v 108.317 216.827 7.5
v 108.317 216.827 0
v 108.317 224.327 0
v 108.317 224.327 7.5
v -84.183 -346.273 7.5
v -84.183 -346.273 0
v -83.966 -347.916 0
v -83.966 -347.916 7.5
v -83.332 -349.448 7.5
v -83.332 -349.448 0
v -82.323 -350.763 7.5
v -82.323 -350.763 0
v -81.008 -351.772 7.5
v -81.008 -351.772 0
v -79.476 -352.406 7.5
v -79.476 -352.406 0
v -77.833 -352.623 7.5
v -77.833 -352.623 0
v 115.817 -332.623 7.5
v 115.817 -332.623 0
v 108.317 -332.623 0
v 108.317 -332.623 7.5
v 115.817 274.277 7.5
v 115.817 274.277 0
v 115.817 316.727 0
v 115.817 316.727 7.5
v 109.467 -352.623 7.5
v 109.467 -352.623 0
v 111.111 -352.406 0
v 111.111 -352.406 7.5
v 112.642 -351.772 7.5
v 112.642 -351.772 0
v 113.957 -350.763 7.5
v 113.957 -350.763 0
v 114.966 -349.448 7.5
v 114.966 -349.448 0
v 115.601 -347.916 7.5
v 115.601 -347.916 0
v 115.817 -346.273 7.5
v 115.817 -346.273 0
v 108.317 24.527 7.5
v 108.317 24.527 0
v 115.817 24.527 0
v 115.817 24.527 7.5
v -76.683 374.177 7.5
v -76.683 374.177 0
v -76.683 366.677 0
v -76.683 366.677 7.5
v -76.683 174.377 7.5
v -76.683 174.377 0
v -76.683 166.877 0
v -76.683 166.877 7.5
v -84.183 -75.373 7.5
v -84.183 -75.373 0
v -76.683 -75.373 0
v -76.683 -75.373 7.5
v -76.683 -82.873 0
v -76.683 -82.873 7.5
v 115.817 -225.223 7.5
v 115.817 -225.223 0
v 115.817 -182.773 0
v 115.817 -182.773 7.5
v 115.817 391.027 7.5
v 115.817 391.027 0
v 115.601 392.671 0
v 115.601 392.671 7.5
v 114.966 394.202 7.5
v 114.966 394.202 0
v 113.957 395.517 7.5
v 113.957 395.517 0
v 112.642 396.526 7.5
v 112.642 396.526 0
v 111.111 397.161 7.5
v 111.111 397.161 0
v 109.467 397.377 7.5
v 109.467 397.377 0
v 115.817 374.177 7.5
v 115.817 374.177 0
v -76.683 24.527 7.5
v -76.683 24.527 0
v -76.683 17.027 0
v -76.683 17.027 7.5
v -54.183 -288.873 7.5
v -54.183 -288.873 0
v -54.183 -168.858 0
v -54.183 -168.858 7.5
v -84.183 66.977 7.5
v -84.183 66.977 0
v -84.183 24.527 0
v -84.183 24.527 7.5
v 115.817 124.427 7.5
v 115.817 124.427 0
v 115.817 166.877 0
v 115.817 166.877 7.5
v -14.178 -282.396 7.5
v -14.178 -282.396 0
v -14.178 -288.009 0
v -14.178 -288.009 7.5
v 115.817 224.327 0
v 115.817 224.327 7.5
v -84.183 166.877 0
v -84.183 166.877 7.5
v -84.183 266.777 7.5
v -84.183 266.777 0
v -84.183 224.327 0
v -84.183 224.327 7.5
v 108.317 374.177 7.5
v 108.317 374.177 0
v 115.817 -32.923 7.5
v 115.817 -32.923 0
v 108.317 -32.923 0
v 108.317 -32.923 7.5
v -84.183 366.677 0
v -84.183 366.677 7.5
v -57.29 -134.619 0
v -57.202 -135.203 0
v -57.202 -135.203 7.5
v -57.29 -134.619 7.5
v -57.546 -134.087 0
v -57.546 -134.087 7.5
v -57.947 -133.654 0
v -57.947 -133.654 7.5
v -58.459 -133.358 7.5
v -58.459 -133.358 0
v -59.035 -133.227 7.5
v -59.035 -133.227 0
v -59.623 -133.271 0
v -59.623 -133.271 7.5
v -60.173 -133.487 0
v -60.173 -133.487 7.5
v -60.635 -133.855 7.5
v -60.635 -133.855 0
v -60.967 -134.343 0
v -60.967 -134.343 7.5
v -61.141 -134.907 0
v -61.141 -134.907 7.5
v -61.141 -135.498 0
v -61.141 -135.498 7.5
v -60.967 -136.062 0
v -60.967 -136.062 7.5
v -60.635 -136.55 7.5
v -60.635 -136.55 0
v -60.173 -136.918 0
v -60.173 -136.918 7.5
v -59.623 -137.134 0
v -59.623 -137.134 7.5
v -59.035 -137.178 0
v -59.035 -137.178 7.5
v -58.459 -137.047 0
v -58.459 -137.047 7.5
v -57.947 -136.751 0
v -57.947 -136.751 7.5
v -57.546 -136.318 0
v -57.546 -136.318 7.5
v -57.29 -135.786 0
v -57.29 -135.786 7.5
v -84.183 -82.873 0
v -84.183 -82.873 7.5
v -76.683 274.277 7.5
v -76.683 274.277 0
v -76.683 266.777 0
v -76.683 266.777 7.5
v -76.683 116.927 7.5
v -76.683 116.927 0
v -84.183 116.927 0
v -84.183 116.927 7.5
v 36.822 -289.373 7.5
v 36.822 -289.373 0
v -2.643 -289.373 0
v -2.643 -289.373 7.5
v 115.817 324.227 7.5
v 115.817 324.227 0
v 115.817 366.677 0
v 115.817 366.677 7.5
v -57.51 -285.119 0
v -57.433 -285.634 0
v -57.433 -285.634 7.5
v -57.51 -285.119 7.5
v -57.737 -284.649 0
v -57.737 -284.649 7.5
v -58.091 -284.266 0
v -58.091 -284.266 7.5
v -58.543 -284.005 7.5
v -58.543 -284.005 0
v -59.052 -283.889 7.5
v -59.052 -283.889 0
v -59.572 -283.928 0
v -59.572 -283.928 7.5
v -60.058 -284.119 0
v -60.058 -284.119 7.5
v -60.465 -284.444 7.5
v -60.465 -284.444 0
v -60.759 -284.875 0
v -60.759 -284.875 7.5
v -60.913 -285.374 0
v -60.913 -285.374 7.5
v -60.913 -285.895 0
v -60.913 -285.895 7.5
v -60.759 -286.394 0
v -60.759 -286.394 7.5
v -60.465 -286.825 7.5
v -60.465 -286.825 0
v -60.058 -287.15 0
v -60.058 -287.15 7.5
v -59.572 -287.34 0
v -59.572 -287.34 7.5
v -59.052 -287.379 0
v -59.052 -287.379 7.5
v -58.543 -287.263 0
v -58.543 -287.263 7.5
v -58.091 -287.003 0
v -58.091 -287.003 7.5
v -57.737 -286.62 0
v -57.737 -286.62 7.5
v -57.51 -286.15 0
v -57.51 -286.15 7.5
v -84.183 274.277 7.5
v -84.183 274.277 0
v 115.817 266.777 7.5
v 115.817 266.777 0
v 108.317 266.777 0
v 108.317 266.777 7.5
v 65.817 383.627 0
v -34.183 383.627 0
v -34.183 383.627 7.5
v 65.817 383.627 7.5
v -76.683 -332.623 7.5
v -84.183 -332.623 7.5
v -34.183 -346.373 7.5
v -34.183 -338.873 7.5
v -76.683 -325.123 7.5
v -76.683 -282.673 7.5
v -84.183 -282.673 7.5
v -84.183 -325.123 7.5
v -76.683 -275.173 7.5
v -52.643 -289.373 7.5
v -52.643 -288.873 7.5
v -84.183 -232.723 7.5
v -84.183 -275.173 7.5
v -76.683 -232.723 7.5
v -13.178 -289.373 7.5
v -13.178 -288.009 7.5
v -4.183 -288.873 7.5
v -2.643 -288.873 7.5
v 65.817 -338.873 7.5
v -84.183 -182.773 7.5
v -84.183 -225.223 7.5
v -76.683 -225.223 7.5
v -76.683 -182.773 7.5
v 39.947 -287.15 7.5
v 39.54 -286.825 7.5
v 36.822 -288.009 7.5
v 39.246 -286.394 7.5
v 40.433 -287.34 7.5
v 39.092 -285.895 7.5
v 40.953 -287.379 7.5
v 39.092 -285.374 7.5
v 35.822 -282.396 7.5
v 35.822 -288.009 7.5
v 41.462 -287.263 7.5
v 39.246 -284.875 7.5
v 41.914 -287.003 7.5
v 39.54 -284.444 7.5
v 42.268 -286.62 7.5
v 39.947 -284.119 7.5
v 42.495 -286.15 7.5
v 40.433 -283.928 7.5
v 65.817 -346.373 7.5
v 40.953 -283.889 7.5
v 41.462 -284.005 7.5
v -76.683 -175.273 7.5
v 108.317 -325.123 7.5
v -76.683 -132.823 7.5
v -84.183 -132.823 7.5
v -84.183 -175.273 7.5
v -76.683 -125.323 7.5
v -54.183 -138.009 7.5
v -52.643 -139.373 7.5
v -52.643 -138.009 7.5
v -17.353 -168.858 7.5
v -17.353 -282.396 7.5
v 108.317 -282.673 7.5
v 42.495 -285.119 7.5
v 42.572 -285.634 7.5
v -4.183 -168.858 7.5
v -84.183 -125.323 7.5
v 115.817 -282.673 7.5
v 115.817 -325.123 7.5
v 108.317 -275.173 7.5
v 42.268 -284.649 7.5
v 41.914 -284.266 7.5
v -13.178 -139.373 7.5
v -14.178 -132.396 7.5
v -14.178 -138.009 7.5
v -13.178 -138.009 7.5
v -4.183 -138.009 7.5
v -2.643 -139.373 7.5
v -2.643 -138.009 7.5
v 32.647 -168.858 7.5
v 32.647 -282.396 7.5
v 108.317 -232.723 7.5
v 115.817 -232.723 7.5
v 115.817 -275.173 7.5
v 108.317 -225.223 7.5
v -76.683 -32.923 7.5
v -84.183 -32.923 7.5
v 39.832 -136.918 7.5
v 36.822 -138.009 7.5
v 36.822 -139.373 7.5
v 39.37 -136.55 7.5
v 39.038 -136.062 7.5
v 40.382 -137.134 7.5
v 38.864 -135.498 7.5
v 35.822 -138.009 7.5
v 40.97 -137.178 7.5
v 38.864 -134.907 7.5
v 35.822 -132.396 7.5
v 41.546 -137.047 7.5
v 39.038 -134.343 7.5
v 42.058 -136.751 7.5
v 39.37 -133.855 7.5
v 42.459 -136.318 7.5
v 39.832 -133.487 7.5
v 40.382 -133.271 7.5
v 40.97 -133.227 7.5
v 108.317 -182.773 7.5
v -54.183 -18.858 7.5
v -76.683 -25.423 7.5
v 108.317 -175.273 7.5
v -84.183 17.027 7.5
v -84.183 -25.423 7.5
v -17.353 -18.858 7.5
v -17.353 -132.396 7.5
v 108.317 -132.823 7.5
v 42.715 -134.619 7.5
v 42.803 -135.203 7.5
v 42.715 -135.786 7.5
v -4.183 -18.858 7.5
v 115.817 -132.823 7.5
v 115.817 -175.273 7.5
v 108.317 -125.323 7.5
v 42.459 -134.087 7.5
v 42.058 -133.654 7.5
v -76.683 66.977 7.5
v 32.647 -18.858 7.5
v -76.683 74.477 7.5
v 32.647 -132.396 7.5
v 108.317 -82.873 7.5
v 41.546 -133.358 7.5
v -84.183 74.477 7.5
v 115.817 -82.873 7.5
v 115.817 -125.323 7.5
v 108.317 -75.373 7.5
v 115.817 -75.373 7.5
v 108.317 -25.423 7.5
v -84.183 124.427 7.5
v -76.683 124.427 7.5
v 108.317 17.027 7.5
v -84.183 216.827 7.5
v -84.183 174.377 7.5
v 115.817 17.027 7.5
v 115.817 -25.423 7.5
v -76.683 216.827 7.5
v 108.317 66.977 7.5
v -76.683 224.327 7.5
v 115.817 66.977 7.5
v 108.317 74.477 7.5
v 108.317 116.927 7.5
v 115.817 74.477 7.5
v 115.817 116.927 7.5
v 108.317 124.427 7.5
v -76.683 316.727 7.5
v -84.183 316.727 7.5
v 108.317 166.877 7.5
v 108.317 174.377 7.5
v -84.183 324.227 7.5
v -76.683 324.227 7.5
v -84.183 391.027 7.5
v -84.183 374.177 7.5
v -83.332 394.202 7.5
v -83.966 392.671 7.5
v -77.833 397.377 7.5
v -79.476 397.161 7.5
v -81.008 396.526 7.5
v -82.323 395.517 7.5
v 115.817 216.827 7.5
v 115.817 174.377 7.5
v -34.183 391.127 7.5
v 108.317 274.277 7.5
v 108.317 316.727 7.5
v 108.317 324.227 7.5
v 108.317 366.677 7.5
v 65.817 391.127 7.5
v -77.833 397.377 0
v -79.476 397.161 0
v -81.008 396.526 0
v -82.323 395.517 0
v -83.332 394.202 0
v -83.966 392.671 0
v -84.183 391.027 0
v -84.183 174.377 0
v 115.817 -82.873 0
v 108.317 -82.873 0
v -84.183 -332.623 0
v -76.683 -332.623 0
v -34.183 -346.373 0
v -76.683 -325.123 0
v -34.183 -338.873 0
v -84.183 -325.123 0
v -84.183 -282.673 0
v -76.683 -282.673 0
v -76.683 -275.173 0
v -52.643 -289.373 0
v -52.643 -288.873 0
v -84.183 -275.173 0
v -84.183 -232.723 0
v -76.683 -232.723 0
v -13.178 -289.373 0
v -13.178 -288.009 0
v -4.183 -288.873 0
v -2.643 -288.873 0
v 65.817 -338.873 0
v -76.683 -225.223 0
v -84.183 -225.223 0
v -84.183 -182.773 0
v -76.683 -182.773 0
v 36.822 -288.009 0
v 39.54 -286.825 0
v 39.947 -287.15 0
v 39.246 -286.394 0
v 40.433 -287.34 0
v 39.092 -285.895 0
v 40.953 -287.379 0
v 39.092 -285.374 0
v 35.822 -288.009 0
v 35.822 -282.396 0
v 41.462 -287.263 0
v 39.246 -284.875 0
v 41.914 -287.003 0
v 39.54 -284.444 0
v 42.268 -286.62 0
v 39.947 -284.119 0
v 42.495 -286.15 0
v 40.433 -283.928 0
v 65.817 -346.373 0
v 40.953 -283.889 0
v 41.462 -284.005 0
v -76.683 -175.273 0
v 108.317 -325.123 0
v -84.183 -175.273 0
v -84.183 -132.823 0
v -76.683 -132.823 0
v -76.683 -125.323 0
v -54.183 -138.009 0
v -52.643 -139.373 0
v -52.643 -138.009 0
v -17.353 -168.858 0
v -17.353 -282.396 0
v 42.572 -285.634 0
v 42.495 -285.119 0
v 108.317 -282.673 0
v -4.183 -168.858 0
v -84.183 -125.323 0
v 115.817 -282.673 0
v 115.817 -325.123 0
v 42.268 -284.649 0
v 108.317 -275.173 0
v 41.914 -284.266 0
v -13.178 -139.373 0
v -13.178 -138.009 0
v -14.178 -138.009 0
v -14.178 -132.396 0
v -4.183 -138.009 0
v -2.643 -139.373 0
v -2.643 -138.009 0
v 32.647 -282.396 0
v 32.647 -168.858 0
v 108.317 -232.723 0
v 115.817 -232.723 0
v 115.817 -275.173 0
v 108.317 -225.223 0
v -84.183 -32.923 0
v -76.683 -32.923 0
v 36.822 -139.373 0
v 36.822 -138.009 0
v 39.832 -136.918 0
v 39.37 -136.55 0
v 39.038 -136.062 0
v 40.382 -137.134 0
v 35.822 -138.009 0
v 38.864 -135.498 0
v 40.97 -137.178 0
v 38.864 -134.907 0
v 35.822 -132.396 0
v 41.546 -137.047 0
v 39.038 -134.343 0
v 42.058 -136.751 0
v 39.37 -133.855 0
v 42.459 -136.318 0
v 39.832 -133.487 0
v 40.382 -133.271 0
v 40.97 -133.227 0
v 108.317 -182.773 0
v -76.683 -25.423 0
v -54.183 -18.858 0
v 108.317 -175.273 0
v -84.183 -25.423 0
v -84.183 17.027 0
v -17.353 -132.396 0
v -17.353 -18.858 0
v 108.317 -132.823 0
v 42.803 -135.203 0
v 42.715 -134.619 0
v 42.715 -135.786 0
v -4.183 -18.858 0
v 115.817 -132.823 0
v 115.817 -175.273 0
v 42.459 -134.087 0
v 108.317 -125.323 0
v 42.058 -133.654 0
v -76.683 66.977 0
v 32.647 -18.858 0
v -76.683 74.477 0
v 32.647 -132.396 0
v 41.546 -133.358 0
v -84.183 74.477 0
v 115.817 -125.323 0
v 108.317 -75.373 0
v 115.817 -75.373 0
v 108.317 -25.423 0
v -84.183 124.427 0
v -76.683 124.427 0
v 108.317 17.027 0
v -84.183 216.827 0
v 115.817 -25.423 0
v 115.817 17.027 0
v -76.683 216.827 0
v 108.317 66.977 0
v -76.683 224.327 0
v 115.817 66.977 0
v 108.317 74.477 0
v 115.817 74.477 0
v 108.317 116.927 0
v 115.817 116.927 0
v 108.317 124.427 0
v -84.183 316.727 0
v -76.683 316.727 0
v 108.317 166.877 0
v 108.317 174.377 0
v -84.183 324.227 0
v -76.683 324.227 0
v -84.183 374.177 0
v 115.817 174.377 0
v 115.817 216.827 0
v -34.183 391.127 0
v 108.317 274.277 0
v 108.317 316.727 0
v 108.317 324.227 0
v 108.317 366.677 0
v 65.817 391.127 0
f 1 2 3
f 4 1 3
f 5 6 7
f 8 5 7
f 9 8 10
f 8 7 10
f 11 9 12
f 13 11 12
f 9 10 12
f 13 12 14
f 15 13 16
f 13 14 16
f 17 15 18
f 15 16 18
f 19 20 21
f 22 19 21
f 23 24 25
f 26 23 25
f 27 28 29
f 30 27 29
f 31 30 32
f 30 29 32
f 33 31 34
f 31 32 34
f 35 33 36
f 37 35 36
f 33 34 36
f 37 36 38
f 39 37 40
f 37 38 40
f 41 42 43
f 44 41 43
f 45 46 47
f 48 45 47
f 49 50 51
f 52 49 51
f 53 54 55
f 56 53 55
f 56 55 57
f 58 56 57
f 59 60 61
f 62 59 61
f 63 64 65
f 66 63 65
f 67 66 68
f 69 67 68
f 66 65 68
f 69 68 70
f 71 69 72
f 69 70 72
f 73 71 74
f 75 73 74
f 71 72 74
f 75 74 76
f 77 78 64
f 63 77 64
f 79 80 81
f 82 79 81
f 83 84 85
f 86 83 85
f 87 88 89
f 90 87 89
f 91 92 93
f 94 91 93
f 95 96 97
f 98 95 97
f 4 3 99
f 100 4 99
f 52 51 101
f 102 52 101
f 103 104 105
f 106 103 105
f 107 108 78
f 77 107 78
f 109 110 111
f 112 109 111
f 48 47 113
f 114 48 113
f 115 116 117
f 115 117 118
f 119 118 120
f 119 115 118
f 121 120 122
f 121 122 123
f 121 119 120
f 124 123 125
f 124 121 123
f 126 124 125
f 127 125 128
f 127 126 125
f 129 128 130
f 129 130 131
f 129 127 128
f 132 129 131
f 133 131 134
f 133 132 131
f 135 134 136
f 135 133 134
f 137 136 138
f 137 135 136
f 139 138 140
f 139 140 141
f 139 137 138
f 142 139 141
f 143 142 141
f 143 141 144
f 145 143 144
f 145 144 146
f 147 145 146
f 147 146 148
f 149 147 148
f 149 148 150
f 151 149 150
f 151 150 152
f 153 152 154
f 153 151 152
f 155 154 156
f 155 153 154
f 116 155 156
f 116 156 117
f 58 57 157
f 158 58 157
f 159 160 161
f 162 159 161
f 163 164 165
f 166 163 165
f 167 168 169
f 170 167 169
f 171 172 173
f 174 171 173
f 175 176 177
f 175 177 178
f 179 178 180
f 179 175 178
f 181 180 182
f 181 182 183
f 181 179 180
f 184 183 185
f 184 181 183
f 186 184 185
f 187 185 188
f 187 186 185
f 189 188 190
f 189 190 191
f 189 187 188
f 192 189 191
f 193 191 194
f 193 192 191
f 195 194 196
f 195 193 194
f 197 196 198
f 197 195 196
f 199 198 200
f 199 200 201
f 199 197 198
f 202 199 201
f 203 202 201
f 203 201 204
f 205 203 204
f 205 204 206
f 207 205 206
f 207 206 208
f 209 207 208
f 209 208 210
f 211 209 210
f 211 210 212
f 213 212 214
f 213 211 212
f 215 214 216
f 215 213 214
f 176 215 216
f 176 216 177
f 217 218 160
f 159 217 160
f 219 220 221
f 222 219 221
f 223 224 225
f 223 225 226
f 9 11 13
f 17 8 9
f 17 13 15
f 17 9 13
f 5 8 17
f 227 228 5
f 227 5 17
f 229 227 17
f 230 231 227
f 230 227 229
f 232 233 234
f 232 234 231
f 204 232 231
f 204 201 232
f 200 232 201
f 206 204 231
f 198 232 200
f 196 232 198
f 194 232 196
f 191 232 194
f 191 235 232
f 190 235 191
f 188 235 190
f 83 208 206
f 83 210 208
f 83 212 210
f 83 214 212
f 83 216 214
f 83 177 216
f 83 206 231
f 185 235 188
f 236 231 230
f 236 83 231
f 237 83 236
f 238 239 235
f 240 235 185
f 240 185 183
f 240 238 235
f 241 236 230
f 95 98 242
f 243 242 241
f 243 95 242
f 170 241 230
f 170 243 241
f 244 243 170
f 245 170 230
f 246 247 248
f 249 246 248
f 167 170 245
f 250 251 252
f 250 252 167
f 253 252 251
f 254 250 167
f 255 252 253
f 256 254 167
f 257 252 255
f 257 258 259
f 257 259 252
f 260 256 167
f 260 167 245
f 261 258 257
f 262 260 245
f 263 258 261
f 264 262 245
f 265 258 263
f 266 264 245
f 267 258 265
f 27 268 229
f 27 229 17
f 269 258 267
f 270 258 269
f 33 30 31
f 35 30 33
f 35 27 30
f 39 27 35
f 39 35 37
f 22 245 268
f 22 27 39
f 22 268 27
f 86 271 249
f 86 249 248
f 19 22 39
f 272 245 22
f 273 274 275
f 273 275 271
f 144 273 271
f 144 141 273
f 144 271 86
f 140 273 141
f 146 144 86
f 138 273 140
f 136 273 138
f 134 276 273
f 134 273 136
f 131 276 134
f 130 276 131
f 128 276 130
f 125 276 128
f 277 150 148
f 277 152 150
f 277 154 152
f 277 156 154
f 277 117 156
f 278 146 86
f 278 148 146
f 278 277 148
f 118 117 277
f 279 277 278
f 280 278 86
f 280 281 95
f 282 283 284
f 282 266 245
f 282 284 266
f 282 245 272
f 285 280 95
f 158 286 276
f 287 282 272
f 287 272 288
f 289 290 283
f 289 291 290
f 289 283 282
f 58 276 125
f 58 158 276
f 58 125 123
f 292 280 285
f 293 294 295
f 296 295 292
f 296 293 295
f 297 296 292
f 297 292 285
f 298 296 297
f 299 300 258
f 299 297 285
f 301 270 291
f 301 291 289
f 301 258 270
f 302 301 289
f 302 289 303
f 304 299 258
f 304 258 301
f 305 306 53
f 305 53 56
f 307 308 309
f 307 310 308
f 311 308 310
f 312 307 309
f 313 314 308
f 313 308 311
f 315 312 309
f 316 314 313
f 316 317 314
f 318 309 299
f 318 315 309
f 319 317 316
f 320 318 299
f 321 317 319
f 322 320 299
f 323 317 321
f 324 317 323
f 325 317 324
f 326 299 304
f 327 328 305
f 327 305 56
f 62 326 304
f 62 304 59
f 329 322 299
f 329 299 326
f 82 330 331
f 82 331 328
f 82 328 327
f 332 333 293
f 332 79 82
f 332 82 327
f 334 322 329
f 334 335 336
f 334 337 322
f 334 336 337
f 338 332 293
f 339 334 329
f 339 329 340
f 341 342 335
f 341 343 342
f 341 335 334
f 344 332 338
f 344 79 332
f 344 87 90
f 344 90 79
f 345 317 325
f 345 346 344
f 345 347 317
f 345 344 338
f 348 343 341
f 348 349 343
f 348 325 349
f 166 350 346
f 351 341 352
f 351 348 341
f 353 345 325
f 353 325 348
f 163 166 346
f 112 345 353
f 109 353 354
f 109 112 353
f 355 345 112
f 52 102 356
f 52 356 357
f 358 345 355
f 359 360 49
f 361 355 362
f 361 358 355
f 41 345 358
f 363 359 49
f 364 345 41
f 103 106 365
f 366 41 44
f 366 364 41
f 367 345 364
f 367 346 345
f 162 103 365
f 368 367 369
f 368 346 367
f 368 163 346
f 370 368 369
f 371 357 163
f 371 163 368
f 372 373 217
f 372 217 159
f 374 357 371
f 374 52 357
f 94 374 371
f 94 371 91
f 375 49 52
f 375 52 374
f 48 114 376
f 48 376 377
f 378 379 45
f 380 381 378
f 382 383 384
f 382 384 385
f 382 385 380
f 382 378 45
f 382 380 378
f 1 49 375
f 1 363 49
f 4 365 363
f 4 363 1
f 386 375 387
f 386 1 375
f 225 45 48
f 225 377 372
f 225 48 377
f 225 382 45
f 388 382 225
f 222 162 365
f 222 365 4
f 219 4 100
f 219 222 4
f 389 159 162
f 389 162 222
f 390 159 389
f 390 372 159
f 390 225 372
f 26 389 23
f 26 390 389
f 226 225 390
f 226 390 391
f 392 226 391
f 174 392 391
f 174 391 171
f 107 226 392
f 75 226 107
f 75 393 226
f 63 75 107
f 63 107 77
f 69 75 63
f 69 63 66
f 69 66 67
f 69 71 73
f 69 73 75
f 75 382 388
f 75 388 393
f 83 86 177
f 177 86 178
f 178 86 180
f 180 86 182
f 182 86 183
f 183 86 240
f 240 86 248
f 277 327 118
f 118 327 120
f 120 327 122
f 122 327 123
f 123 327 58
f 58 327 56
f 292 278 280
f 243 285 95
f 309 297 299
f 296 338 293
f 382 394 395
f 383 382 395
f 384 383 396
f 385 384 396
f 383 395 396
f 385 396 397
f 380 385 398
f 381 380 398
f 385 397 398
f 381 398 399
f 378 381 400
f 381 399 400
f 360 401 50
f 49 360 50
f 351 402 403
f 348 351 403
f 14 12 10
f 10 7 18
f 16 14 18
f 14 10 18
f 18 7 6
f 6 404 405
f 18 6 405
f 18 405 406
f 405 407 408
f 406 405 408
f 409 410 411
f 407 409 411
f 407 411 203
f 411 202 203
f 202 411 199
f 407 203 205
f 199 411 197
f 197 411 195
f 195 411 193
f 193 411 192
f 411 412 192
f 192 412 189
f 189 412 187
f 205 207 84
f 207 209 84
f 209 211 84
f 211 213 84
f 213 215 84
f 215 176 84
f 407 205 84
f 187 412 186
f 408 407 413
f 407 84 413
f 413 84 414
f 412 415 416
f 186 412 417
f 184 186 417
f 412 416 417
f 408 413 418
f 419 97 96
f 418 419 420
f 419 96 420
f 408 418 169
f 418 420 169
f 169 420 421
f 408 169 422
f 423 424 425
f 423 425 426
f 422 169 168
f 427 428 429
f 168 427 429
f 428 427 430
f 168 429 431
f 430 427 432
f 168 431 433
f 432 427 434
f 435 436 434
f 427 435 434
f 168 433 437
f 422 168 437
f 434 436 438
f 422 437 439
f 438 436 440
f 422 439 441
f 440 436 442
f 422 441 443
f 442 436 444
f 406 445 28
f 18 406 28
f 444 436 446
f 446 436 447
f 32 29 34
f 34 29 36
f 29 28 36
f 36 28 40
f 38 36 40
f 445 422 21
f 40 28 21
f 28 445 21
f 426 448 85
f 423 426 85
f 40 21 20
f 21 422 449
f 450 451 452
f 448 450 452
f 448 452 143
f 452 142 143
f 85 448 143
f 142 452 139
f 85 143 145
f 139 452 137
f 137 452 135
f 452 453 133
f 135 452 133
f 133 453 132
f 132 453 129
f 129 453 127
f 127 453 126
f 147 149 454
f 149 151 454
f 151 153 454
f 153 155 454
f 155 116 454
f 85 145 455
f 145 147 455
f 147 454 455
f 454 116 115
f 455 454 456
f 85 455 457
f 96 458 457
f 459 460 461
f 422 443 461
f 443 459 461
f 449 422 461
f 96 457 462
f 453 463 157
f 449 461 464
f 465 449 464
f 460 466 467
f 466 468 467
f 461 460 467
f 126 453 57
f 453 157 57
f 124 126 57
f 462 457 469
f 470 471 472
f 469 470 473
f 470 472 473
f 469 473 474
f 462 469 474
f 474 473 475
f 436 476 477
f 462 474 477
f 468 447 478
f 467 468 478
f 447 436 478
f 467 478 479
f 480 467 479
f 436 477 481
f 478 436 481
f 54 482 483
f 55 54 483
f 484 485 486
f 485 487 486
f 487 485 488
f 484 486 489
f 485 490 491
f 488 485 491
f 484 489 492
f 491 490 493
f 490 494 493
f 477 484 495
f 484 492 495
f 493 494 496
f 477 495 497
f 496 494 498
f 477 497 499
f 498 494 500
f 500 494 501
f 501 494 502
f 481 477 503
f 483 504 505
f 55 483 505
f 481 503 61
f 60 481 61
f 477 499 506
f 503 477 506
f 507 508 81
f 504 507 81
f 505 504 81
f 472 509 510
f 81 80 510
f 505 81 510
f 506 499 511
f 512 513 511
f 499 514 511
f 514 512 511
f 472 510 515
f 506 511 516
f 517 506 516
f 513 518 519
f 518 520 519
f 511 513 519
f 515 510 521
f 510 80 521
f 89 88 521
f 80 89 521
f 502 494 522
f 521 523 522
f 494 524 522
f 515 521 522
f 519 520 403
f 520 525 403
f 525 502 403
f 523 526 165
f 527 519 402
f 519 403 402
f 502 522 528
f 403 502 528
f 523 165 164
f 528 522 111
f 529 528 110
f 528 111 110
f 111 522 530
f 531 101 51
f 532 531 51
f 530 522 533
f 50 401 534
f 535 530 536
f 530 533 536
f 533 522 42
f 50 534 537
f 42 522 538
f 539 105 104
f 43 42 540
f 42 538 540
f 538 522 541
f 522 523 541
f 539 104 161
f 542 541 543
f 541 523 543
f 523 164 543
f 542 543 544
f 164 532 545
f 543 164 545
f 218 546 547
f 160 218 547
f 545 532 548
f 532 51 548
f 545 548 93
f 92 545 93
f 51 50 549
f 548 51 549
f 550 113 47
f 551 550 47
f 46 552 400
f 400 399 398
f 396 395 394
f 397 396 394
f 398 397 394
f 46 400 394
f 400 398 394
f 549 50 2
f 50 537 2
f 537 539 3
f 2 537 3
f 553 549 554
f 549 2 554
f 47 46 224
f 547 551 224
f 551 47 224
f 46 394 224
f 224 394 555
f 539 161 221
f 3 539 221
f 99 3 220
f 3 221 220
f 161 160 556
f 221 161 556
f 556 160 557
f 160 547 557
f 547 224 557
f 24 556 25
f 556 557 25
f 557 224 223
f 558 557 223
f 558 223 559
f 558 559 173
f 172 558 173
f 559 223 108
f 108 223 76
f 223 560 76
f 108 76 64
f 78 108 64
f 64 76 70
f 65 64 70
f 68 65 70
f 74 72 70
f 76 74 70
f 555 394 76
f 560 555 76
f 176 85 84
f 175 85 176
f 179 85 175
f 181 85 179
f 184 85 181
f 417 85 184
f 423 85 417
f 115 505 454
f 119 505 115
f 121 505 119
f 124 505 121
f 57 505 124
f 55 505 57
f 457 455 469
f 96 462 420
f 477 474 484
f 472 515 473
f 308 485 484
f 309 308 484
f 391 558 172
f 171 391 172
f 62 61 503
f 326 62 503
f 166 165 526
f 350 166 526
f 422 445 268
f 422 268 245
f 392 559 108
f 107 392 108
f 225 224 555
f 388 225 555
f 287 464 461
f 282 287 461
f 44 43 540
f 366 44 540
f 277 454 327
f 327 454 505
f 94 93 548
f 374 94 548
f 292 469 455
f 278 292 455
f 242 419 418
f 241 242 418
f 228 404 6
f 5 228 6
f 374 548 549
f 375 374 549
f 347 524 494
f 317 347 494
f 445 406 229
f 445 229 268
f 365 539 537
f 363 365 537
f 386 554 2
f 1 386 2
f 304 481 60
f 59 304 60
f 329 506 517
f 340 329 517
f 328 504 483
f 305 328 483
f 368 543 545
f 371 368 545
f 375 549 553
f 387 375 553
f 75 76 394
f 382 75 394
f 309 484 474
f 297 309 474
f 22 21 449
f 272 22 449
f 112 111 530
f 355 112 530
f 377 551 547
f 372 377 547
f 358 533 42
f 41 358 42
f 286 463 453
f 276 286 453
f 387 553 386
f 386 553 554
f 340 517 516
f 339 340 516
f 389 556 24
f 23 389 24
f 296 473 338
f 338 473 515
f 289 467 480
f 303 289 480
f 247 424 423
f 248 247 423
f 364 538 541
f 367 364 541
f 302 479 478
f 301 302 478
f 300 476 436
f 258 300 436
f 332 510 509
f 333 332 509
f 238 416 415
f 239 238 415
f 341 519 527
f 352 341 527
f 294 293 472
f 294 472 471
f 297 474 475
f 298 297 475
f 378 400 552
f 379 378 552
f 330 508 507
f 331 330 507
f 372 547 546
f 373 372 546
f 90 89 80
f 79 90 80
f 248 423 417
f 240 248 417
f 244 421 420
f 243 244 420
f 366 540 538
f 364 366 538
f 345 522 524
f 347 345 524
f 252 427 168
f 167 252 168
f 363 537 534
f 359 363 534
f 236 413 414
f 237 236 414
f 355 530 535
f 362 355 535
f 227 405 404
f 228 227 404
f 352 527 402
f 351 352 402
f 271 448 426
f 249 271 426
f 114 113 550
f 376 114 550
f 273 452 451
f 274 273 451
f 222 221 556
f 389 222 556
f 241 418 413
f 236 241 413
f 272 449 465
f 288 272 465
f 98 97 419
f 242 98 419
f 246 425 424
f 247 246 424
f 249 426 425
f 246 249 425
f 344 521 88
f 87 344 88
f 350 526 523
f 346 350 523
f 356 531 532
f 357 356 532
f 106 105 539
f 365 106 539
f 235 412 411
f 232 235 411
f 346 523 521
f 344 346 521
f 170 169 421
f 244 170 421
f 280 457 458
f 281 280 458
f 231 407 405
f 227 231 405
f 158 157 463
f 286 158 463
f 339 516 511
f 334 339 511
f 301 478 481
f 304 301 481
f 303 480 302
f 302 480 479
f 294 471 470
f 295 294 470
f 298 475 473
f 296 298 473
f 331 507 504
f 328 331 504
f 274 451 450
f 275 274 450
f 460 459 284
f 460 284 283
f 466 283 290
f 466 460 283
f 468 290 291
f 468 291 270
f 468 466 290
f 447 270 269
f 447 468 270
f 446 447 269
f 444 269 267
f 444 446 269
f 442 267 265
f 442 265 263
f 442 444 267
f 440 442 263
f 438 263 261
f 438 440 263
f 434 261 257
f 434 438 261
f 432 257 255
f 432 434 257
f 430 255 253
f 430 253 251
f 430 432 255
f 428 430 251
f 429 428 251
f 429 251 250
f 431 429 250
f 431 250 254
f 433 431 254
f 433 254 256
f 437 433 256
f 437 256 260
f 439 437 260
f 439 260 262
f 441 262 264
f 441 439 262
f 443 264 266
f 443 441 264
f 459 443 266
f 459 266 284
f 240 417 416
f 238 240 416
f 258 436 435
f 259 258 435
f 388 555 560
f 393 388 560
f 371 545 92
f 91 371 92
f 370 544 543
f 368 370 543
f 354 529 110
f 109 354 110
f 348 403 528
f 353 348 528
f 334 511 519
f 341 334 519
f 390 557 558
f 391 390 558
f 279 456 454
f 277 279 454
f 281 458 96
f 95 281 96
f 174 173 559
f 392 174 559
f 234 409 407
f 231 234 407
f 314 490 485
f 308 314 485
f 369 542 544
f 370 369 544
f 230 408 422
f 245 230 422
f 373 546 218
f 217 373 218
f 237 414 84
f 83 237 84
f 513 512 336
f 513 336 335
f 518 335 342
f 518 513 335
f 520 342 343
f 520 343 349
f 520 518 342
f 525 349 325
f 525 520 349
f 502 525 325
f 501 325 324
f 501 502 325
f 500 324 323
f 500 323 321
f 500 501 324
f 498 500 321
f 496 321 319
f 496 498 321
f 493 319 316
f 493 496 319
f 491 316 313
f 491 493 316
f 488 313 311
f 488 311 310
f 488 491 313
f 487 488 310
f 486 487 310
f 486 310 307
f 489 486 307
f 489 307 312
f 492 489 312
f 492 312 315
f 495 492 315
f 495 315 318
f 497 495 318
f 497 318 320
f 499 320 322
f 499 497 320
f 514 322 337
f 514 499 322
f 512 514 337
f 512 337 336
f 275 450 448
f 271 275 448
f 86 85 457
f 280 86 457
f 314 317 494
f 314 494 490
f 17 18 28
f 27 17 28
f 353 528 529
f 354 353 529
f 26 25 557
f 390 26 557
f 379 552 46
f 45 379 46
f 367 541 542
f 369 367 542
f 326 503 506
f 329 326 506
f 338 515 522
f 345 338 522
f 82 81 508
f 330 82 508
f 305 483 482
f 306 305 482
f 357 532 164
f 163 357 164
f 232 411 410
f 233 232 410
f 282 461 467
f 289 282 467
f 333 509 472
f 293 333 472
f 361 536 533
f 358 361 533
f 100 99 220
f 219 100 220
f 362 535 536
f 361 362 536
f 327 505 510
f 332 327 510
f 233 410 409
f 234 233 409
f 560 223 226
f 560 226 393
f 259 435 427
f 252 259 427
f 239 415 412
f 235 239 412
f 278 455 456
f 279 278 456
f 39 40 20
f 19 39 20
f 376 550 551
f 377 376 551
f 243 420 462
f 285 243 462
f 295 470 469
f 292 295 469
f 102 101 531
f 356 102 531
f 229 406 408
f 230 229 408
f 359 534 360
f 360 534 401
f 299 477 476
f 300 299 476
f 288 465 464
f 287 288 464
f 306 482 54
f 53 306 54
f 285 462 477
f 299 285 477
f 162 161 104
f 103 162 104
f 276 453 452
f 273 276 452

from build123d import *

# Parameters (mm, degrees)
F0_R     = 1.75
F0_R_2   = 1.981
F0_W     = 100
F0_H     = 7.5
F1_DEPTH = 7.5


with BuildPart() as f1:
    # F0 (on Top) → F1 (new body)
    with BuildSketch(Plane.XY):
        with BuildLine():
            Line((109.467205, 397.377165), (-77.832795, 397.377165))
            ThreePointArc((-77.832795, 397.377165), (-82.322924, 395.517293), (-84.182795, 391.027165))
            Line((-84.182795, 391.027165), (-84.182795, 374.177175))
            Line((-84.182795, 374.177175), (-76.682795, 374.177175))
            Line((-76.682795, 374.177175), (-76.682795, 366.677175))
            Line((-76.682795, 366.677175), (-84.182795, 366.677175))
            Line((-84.182795, 366.677175), (-84.182795, 324.227175))
            Line((-84.182795, 324.227175), (-76.682795, 324.227175))
            Line((-76.682795, 324.227175), (-76.682795, 316.727175))
            Line((-76.682795, 316.727175), (-84.182795, 316.727175))
            Line((-84.182795, 316.727175), (-84.182795, 274.277175))
            Line((-84.182795, 274.277175), (-76.682795, 274.277175))
            Line((-76.682795, 274.277175), (-76.682795, 266.777175))
            Line((-76.682795, 266.777175), (-84.182795, 266.777175))
            Line((-84.182795, 266.777175), (-84.182795, 224.327175))
            Line((-84.182795, 224.327175), (-76.682795, 224.327175))
            Line((-76.682795, 224.327175), (-76.682795, 216.827175))
            Line((-76.682795, 216.827175), (-84.182795, 216.827175))
            Line((-84.182795, 216.827175), (-84.182795, 174.377175))
            Line((-84.182795, 174.377175), (-76.682795, 174.377175))
            Line((-76.682795, 174.377175), (-76.682795, 166.877175))
            Line((-76.682795, 166.877175), (-84.182795, 166.877175))
            Line((-84.182795, 166.877175), (-84.182795, 124.427175))
            Line((-84.182795, 124.427175), (-76.682795, 124.427175))
            Line((-76.682795, 124.427175), (-76.682795, 116.927175))
            Line((-76.682795, 116.927175), (-84.182795, 116.927175))
            Line((-84.182795, 116.927175), (-84.182795, 74.477175))
            Line((-84.182795, 74.477175), (-76.682795, 74.477175))
            Line((-76.682795, 74.477175), (-76.682795, 66.977175))
            Line((-76.682795, 66.977175), (-84.182795, 66.977175))
            Line((-84.182795, 66.977175), (-84.182795, 24.527175))
            Line((-84.182795, 24.527175), (-76.682795, 24.527175))
            Line((-76.682795, 24.527175), (-76.682795, 17.027175))
            Line((-76.682795, 17.027175), (-84.182795, 17.027175))
            Line((-84.182795, 17.027175), (-84.182795, -25.422825))
            Line((-84.182795, -25.422825), (-76.682795, -25.422825))
            Line((-76.682795, -25.422825), (-76.682795, -32.922825))
            Line((-76.682795, -32.922825), (-84.182795, -32.922825))
            Line((-84.182795, -32.922825), (-84.182795, -75.372825))
            Line((-84.182795, -75.372825), (-76.682795, -75.372825))
            Line((-76.682795, -75.372825), (-76.682795, -82.872825))
            Line((-76.682795, -82.872825), (-84.182795, -82.872825))
            Line((-84.182795, -82.872825), (-84.182795, -125.322825))
            Line((-84.182795, -125.322825), (-76.682795, -125.322825))
            Line((-76.682795, -125.322825), (-76.682795, -132.822825))
            Line((-76.682795, -132.822825), (-84.182795, -132.822825))
            Line((-84.182795, -132.822825), (-84.182795, -175.272825))
            Line((-84.182795, -175.272825), (-76.682795, -175.272825))
            Line((-76.682795, -175.272825), (-76.682795, -182.772825))
            Line((-76.682795, -182.772825), (-84.182795, -182.772825))
            Line((-84.182795, -182.772825), (-84.182795, -225.222825))
            Line((-84.182795, -225.222825), (-76.682795, -225.222825))
            Line((-76.682795, -225.222825), (-76.682795, -232.722825))
            Line((-76.682795, -232.722825), (-84.182795, -232.722825))
            Line((-84.182795, -232.722825), (-84.182795, -275.172825))
            Line((-84.182795, -275.172825), (-76.682795, -275.172825))
            Line((-76.682795, -275.172825), (-76.682795, -282.672825))
            Line((-76.682795, -282.672825), (-84.182795, -282.672825))
            Line((-84.182795, -282.672825), (-84.182795, -325.122825))
            Line((-84.182795, -325.122825), (-76.682795, -325.122825))
            Line((-76.682795, -325.122825), (-76.682795, -332.622825))
            Line((-76.682795, -332.622825), (-84.182795, -332.622825))
            Line((-84.182795, -332.622825), (-84.182795, -346.272835))
            ThreePointArc((-84.182795, -346.272835), (-82.322924, -350.762964), (-77.832795, -352.622835))
            Line((-77.832795, -352.622835), (109.467205, -352.622835))
            ThreePointArc((109.467205, -352.622835), (113.957333, -350.762964), (115.817205, -346.272835))
            Line((115.817205, -346.272835), (115.817205, -332.622835))
            Line((115.817205, -332.622835), (108.317205, -332.622835))
            Line((108.317205, -332.622835), (108.317205, -325.122835))
            Line((108.317205, -325.122835), (115.817205, -325.122835))
            Line((115.817205, -325.122835), (115.817205, -282.672835))
            Line((115.817205, -282.672835), (108.317205, -282.672835))
            Line((108.317205, -282.672835), (108.317205, -275.172835))
            Line((108.317205, -275.172835), (115.817205, -275.172835))
            Line((115.817205, -275.172835), (115.817205, -232.722835))
            Line((115.817205, -232.722835), (108.317205, -232.722835))
            Line((108.317205, -232.722835), (108.317205, -225.222835))
            Line((108.317205, -225.222835), (115.817205, -225.222835))
            Line((115.817205, -225.222835), (115.817205, -182.772835))
            Line((115.817205, -182.772835), (108.317205, -182.772835))
            Line((108.317205, -182.772835), (108.317205, -175.272835))
            Line((108.317205, -175.272835), (115.817205, -175.272835))
            Line((115.817205, -175.272835), (115.817205, -132.822835))
            Line((115.817205, -132.822835), (108.317205, -132.822835))
            Line((108.317205, -132.822835), (108.317205, -125.322835))
            Line((108.317205, -125.322835), (115.817205, -125.322835))
            Line((115.817205, -125.322835), (115.817205, -82.872835))
            Line((115.817205, -82.872835), (108.317205, -82.872835))
            Line((108.317205, -82.872835), (108.317205, -75.372835))
            Line((108.317205, -75.372835), (115.817205, -75.372835))
            Line((115.817205, -75.372835), (115.817205, -32.922835))
            Line((115.817205, -32.922835), (108.317205, -32.922835))
            Line((108.317205, -32.922835), (108.317205, -25.422835))
            Line((108.317205, -25.422835), (115.817205, -25.422835))
            Line((115.817205, -25.422835), (115.817205, 17.027165))
            Line((115.817205, 17.027165), (108.317205, 17.027165))
            Line((108.317205, 17.027165), (108.317205, 24.527165))
            Line((108.317205, 24.527165), (115.817205, 24.527165))
            Line((115.817205, 24.527165), (115.817205, 66.977165))
            Line((115.817205, 66.977165), (108.317205, 66.977165))
            Line((108.317205, 66.977165), (108.317205, 74.477165))
            Line((108.317205, 74.477165), (115.817205, 74.477165))
            Line((115.817205, 74.477165), (115.817205, 116.927165))
            Line((115.817205, 116.927165), (108.317205, 116.927165))
            Line((108.317205, 116.927165), (108.317205, 124.427165))
            Line((108.317205, 124.427165), (115.817205, 124.427165))
            Line((115.817205, 124.427165), (115.817205, 166.877165))
            Line((115.817205, 166.877165), (108.317205, 166.877165))
            Line((108.317205, 166.877165), (108.317205, 174.377165))
            Line((108.317205, 174.377165), (115.817205, 174.377165))
            Line((115.817205, 174.377165), (115.817205, 216.827165))
            Line((115.817205, 216.827165), (108.317205, 216.827165))
            Line((108.317205, 216.827165), (108.317205, 224.327165))
            Line((108.317205, 224.327165), (115.817205, 224.327165))
            Line((115.817205, 224.327165), (115.817205, 266.777165))
            Line((115.817205, 266.777165), (108.317205, 266.777165))
            Line((108.317205, 266.777165), (108.317205, 274.277165))
            Line((108.317205, 274.277165), (115.817205, 274.277165))
            Line((115.817205, 274.277165), (115.817205, 316.727165))
            Line((115.817205, 316.727165), (108.317205, 316.727165))
            Line((108.317205, 316.727165), (108.317205, 324.227165))
            Line((108.317205, 324.227165), (115.817205, 324.227165))
            Line((115.817205, 324.227165), (115.817205, 366.677165))
            Line((115.817205, 366.677165), (108.317205, 366.677165))
            Line((108.317205, 366.677165), (108.317205, 374.177165))
            Line((108.317205, 374.177165), (115.817205, 374.177165))
            Line((115.817205, 374.177165), (115.817205, 391.027165))
            ThreePointArc((115.817205, 391.027165), (113.957333, 395.517293), (109.467205, 397.377165))
        make_face()
        with Locations((-59.182573, -285.634338)):
            Circle(F0_R, mode=Mode.SUBTRACT)
        Polygon((-48.162773, -168.857838), (-41.787373, -168.857838), (-29.747773, -168.857838), (-23.372373, -168.857838), (-17.352573, -168.857838), (-17.352573, -180.237038), (-17.352573, -282.395838), (-14.177573, -282.395838), (-14.177573, -284.935838), (-14.177573, -286.586838), (-14.177573, -288.009238), (-13.177573, -288.009238), (-13.177573, -288.872838), (-13.177573, -289.372838), (-14.177573, -289.372838), (-32.592573, -289.372838), (-33.227573, -289.372838), (-51.642573, -289.372838), (-52.642573, -289.372838), (-52.642573, -288.872838), (-54.182573, -288.872838), (-54.182573, -282.395838), (-54.182573, -180.237038), (-54.182573, -168.857838), align=None, mode=Mode.SUBTRACT)
        with Locations((-59.182573, -135.202538)):
            Circle(F0_R_2, mode=Mode.SUBTRACT)
        Polygon((-52.642573, -138.872838), (-52.642573, -138.009238), (-54.182573, -138.009238), (-54.182573, -132.395838), (-54.182573, -30.237038), (-54.182573, -18.857838), (-48.162773, -18.857838), (-41.787373, -18.857838), (-29.747773, -18.857838), (-23.372373, -18.857838), (-17.352573, -18.857838), (-17.352573, -30.237038), (-17.352573, -132.395838), (-14.177573, -132.395838), (-14.177573, -134.935838), (-14.177573, -136.586838), (-14.177573, -138.009238), (-13.177573, -138.009238), (-13.177573, -138.872838), (-13.177573, -139.372838), (-14.177573, -139.372838), (-32.592573, -139.372838), (-33.227573, -139.372838), (-51.642573, -139.372838), (-52.642573, -139.372838), align=None, mode=Mode.SUBTRACT)
        with Locations((15.817205, -342.622835)):
            Rectangle(F0_W, F0_H, mode=Mode.SUBTRACT)
        with Locations((40.822427, -285.634338)):
            Circle(F0_R, mode=Mode.SUBTRACT)
        Polygon((-4.182573, -288.872838), (-4.182573, -282.395838), (-4.182573, -180.237038), (-4.182573, -168.857838), (1.837227, -168.857838), (8.212627, -168.857838), (20.252227, -168.857838), (26.627627, -168.857838), (32.647427, -168.857838), (32.647427, -180.237038), (32.647427, -282.395838), (35.822427, -282.395838), (35.822427, -284.935838), (35.822427, -286.586838), (35.822427, -288.009238), (36.822427, -288.009238), (36.822427, -288.872838), (36.822427, -289.372838), (35.822427, -289.372838), (16.772427, -289.372838), (-1.642573, -289.372838), (-2.642573, -289.372838), (-2.642573, -288.872838), align=None, mode=Mode.SUBTRACT)
        Polygon((32.647427, -18.857838), (32.647427, -30.237038), (32.647427, -132.395838), (35.822427, -132.395838), (35.822427, -134.935838), (35.822427, -136.586838), (35.822427, -138.009238), (36.822427, -138.009238), (36.822427, -138.872838), (36.822427, -139.372838), (35.822427, -139.372838), (17.407427, -139.372838), (16.772427, -139.372838), (-1.642573, -139.372838), (-2.642573, -139.372838), (-2.642573, -138.872838), (-2.642573, -138.009238), (-4.182573, -138.009238), (-4.182573, -132.395838), (-4.182573, -30.237038), (-4.182573, -18.857838), (1.837227, -18.857838), (8.212627, -18.857838), (20.252227, -18.857838), (26.627627, -18.857838), align=None, mode=Mode.SUBTRACT)
        with Locations((40.822427, -135.202538)):
            Circle(F0_R_2, mode=Mode.SUBTRACT)
        with Locations((15.817205, 387.377165)):
            Rectangle(F0_W, F0_H, mode=Mode.SUBTRACT)
    extrude(amount=F1_DEPTH)


solid = f1.part
